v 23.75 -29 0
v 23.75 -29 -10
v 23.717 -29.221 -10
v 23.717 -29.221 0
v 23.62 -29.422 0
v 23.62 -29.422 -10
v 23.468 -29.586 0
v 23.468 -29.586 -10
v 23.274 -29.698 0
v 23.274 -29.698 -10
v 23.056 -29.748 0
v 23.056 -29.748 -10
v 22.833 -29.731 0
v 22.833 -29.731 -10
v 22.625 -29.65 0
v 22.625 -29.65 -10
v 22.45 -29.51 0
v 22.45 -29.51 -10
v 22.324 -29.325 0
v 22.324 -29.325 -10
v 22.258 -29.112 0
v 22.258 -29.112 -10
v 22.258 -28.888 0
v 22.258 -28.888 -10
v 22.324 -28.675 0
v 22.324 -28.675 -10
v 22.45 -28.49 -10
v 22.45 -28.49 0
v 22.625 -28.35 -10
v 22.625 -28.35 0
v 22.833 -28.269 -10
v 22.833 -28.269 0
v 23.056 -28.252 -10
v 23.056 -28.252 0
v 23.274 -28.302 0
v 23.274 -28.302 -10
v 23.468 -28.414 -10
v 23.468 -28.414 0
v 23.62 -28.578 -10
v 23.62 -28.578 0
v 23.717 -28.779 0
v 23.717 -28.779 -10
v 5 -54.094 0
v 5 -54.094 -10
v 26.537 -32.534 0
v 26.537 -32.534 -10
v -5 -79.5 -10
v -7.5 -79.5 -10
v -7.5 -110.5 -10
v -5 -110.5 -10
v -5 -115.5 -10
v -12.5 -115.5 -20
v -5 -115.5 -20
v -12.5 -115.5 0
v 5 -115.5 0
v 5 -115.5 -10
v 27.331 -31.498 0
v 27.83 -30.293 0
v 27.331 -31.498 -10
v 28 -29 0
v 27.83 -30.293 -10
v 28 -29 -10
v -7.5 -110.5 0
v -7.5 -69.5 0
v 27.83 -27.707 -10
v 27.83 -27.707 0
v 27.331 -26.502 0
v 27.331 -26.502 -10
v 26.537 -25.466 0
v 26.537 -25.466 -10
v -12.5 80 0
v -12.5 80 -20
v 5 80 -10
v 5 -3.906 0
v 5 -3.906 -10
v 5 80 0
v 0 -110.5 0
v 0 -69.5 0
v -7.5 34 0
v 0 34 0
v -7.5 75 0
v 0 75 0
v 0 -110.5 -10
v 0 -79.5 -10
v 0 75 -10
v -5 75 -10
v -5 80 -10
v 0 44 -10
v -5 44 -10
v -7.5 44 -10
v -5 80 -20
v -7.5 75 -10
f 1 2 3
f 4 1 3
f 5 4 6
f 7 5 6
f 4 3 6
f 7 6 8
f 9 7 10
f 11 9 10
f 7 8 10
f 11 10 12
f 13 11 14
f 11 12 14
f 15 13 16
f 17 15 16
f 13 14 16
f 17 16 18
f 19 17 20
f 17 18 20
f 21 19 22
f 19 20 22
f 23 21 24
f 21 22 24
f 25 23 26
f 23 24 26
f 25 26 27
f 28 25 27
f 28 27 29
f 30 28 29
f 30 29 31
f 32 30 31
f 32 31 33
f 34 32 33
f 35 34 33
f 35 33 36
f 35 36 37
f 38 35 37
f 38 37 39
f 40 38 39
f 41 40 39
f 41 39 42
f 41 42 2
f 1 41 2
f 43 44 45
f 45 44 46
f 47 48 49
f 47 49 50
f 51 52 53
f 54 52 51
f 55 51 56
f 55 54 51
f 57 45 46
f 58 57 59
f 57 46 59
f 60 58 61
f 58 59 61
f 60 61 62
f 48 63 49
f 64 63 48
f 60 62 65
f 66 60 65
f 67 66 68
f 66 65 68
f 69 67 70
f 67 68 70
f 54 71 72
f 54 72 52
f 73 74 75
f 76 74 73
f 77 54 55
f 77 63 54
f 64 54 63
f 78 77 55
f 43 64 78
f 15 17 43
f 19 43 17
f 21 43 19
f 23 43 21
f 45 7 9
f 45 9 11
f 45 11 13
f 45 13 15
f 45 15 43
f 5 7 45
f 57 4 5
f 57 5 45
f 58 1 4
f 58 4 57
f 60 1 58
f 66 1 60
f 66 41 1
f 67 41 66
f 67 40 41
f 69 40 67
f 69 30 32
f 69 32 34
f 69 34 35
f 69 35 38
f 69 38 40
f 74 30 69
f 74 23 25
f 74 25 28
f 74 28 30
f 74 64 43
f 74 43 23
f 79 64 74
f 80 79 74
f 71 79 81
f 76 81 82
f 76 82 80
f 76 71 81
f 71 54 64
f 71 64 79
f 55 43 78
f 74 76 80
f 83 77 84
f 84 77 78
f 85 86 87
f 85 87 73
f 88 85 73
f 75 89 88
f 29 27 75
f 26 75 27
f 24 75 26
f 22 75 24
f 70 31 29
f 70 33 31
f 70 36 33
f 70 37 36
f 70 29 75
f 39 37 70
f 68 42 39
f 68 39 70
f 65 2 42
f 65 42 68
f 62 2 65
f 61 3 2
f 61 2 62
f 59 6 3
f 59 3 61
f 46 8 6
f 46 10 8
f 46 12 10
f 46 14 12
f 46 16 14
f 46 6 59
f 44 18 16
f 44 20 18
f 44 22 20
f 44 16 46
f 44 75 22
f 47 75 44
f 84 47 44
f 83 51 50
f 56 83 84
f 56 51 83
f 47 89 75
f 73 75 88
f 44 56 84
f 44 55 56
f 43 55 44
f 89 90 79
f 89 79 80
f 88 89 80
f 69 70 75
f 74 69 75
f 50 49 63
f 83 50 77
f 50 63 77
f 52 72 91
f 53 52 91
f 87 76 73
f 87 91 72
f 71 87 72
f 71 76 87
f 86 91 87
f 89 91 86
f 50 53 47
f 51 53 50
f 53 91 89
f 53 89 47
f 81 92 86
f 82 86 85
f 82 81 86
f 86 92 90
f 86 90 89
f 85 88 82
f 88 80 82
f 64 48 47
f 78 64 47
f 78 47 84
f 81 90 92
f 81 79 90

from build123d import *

# Parameters (mm, degrees)
F0_W     = 7.5
F0_H     = 41
F1_DEPTH = 20
F2_DEPTH = 10
F3_SIZE  = 9.99999
F4_W     = 10
F4_H     = 10
F5_DEPTH = 195.501
F7_DEPTH = 10
F8_R     = 0.75
F9_DEPTH = 25


# Not quite as in the source:
# - a fillet or chamfer is up to 0.001 mm smaller than in the source, because OpenCascade refuses the exact size


with BuildPart() as f1:
    # F0 (on Top) → F1 (new body)
    with BuildSketch(Plane.XY):
        Polygon((-12.5, 80), (-12.5, 75), (-12.5, -115.5), (5, -115.5), (5, -110.5), (5, 80), align=None)
        Polygon((0, 34), (0, 0), (0, -7.5), (0, -69.5), (0, -110.5), (-7.5, -110.5), (-7.5, -69.5), (-7.5, 34), (-7.5, 75), (0, 75), align=None, mode=Mode.SUBTRACT)
        with Locations((-3.75, -90)):
            Rectangle(F0_W, F0_H)
        Polygon((0, -7.5), (0, 0), (0, 34), (-7.5, 34), (-7.5, -69.5), (0, -69.5), align=None)
        with Locations((-3.75, 54.5)):
            Rectangle(F0_W, F0_H)
    extrude(amount=-F1_DEPTH)

    # F0 (on Top) → F2 (cut)
    with BuildSketch(Plane.XY):
        with Locations((-3.75, 54.5)):
            Rectangle(F0_W, F0_H)
        with Locations((-3.75, -90)):
            Rectangle(F0_W, F0_H)
    extrude(amount=-F2_DEPTH, mode=Mode.SUBTRACT)

    # F3 (size 10 in the source; OpenCascade refuses exactly that, so slightly less here)
    f3_edges = [f1.edges().sort_by_distance(p)[0] for p in [
        (-3.75, -69.5, -10),
        (-3.75, 34, -10),
    ]]
    chamfer(f3_edges, length=F3_SIZE)

    # F4 (on face) → F5 (cut, through all)
    with BuildSketch(Plane.XZ.offset(115.5)):
        with Locations((0, -15)):
            Rectangle(F4_W, F4_H)
    extrude(amount=-F5_DEPTH, mode=Mode.SUBTRACT)

    # F6 (on face) → F7 (join)
    with BuildSketch(Plane.XY):
        with BuildLine():
            Line((29, -22.6551367564), (5, -3.9060580615))
            Line((5, -3.9060580615), (5, -54.0939419385))
            Line((5, -54.0939419385), (32.0781262822, -32.9401952478))
            ThreePointArc((32.0781262822, -32.9401952478), (26.8080409916, -33.4939198597), (24, -29))
            ThreePointArc((24, -29), (25.4644660941, -25.4644660941), (29, -24))
            Line((29, -24), (29, -22.6551367564))
        make_face()
        with BuildLine():
            Line((32.0781262822, -25.0598047522), (29, -22.6551367564))
            Line((29, -22.6551367564), (29, -24))
            ThreePointArc((29, -24), (30.627732128, -24.2723697142), (32.0781262822, -25.0598047522))
        make_face()
        with BuildLine():
            ThreePointArc((32.0781262822, -25.0598047522), (30.627732128, -24.2723697142), (29, -24))
            Line((29, -24), (29, -28.5))
            ThreePointArc((29, -28.5), (29.3535533906, -28.6464466094), (29.5, -29))
            ThreePointArc((29.5, -29), (29, -29.5), (28.5, -29))
            Line((28.5, -29), (24, -29))
            ThreePointArc((24, -29), (26.8080409916, -33.4939198597), (32.0781262822, -32.9401952478))
            ThreePointArc((32.0781262822, -32.9401952478), (33.4939198597, -31.1919590084), (34, -29))
            ThreePointArc((34, -29), (33.4939198597, -26.8080409916), (32.0781262822, -25.0598047522))
        make_face()
        with BuildLine():
            Line((29, -28.5), (29, -24))
            ThreePointArc((29, -24), (25.4644660941, -25.4644660941), (24, -29))
            Line((24, -29), (28.5, -29))
            ThreePointArc((28.5, -29), (28.6464466094, -28.6464466094), (29, -28.5))
        make_face()
    extrude(amount=-F7_DEPTH)

    # F8 (on face) → F9 (cut)
    with BuildSketch(Plane(origin=(0, 0, -10), x_dir=(1, 0, 0), z_dir=(0, 0, -1))):
        with Locations((23, 29)):
            Circle(F8_R)
        with BuildLine():
            ThreePointArc((26.537409976, 32.5336568398), (27.6199052956, 30.9121911672), (28, 29))
            ThreePointArc((28, 29), (27.6199052956, 27.0878088328), (26.537409976, 25.4663431602))
            Line((26.537409976, 25.4663431602), (5, 3.9060580615))
            Line((5, 3.9060580615), (32.0781262822, 25.0598047522))
            ThreePointArc((32.0781262822, 25.0598047522), (34, 29), (32.0781262822, 32.9401952478))
            Line((32.0781262822, 32.9401952478), (5, 54.0939419385))
            Line((5, 54.0939419385), (26.537409976, 32.5336568398))
        make_face()
        with BuildLine():
            ThreePointArc((29.5, 29), (29, 28.5), (28.5, 29))
            ThreePointArc((28.5, 29), (29, 29.5), (29.5, 29))
        make_face(mode=Mode.SUBTRACT)
    extrude(amount=-F9_DEPTH, mode=Mode.SUBTRACT)


solid = f1.part
